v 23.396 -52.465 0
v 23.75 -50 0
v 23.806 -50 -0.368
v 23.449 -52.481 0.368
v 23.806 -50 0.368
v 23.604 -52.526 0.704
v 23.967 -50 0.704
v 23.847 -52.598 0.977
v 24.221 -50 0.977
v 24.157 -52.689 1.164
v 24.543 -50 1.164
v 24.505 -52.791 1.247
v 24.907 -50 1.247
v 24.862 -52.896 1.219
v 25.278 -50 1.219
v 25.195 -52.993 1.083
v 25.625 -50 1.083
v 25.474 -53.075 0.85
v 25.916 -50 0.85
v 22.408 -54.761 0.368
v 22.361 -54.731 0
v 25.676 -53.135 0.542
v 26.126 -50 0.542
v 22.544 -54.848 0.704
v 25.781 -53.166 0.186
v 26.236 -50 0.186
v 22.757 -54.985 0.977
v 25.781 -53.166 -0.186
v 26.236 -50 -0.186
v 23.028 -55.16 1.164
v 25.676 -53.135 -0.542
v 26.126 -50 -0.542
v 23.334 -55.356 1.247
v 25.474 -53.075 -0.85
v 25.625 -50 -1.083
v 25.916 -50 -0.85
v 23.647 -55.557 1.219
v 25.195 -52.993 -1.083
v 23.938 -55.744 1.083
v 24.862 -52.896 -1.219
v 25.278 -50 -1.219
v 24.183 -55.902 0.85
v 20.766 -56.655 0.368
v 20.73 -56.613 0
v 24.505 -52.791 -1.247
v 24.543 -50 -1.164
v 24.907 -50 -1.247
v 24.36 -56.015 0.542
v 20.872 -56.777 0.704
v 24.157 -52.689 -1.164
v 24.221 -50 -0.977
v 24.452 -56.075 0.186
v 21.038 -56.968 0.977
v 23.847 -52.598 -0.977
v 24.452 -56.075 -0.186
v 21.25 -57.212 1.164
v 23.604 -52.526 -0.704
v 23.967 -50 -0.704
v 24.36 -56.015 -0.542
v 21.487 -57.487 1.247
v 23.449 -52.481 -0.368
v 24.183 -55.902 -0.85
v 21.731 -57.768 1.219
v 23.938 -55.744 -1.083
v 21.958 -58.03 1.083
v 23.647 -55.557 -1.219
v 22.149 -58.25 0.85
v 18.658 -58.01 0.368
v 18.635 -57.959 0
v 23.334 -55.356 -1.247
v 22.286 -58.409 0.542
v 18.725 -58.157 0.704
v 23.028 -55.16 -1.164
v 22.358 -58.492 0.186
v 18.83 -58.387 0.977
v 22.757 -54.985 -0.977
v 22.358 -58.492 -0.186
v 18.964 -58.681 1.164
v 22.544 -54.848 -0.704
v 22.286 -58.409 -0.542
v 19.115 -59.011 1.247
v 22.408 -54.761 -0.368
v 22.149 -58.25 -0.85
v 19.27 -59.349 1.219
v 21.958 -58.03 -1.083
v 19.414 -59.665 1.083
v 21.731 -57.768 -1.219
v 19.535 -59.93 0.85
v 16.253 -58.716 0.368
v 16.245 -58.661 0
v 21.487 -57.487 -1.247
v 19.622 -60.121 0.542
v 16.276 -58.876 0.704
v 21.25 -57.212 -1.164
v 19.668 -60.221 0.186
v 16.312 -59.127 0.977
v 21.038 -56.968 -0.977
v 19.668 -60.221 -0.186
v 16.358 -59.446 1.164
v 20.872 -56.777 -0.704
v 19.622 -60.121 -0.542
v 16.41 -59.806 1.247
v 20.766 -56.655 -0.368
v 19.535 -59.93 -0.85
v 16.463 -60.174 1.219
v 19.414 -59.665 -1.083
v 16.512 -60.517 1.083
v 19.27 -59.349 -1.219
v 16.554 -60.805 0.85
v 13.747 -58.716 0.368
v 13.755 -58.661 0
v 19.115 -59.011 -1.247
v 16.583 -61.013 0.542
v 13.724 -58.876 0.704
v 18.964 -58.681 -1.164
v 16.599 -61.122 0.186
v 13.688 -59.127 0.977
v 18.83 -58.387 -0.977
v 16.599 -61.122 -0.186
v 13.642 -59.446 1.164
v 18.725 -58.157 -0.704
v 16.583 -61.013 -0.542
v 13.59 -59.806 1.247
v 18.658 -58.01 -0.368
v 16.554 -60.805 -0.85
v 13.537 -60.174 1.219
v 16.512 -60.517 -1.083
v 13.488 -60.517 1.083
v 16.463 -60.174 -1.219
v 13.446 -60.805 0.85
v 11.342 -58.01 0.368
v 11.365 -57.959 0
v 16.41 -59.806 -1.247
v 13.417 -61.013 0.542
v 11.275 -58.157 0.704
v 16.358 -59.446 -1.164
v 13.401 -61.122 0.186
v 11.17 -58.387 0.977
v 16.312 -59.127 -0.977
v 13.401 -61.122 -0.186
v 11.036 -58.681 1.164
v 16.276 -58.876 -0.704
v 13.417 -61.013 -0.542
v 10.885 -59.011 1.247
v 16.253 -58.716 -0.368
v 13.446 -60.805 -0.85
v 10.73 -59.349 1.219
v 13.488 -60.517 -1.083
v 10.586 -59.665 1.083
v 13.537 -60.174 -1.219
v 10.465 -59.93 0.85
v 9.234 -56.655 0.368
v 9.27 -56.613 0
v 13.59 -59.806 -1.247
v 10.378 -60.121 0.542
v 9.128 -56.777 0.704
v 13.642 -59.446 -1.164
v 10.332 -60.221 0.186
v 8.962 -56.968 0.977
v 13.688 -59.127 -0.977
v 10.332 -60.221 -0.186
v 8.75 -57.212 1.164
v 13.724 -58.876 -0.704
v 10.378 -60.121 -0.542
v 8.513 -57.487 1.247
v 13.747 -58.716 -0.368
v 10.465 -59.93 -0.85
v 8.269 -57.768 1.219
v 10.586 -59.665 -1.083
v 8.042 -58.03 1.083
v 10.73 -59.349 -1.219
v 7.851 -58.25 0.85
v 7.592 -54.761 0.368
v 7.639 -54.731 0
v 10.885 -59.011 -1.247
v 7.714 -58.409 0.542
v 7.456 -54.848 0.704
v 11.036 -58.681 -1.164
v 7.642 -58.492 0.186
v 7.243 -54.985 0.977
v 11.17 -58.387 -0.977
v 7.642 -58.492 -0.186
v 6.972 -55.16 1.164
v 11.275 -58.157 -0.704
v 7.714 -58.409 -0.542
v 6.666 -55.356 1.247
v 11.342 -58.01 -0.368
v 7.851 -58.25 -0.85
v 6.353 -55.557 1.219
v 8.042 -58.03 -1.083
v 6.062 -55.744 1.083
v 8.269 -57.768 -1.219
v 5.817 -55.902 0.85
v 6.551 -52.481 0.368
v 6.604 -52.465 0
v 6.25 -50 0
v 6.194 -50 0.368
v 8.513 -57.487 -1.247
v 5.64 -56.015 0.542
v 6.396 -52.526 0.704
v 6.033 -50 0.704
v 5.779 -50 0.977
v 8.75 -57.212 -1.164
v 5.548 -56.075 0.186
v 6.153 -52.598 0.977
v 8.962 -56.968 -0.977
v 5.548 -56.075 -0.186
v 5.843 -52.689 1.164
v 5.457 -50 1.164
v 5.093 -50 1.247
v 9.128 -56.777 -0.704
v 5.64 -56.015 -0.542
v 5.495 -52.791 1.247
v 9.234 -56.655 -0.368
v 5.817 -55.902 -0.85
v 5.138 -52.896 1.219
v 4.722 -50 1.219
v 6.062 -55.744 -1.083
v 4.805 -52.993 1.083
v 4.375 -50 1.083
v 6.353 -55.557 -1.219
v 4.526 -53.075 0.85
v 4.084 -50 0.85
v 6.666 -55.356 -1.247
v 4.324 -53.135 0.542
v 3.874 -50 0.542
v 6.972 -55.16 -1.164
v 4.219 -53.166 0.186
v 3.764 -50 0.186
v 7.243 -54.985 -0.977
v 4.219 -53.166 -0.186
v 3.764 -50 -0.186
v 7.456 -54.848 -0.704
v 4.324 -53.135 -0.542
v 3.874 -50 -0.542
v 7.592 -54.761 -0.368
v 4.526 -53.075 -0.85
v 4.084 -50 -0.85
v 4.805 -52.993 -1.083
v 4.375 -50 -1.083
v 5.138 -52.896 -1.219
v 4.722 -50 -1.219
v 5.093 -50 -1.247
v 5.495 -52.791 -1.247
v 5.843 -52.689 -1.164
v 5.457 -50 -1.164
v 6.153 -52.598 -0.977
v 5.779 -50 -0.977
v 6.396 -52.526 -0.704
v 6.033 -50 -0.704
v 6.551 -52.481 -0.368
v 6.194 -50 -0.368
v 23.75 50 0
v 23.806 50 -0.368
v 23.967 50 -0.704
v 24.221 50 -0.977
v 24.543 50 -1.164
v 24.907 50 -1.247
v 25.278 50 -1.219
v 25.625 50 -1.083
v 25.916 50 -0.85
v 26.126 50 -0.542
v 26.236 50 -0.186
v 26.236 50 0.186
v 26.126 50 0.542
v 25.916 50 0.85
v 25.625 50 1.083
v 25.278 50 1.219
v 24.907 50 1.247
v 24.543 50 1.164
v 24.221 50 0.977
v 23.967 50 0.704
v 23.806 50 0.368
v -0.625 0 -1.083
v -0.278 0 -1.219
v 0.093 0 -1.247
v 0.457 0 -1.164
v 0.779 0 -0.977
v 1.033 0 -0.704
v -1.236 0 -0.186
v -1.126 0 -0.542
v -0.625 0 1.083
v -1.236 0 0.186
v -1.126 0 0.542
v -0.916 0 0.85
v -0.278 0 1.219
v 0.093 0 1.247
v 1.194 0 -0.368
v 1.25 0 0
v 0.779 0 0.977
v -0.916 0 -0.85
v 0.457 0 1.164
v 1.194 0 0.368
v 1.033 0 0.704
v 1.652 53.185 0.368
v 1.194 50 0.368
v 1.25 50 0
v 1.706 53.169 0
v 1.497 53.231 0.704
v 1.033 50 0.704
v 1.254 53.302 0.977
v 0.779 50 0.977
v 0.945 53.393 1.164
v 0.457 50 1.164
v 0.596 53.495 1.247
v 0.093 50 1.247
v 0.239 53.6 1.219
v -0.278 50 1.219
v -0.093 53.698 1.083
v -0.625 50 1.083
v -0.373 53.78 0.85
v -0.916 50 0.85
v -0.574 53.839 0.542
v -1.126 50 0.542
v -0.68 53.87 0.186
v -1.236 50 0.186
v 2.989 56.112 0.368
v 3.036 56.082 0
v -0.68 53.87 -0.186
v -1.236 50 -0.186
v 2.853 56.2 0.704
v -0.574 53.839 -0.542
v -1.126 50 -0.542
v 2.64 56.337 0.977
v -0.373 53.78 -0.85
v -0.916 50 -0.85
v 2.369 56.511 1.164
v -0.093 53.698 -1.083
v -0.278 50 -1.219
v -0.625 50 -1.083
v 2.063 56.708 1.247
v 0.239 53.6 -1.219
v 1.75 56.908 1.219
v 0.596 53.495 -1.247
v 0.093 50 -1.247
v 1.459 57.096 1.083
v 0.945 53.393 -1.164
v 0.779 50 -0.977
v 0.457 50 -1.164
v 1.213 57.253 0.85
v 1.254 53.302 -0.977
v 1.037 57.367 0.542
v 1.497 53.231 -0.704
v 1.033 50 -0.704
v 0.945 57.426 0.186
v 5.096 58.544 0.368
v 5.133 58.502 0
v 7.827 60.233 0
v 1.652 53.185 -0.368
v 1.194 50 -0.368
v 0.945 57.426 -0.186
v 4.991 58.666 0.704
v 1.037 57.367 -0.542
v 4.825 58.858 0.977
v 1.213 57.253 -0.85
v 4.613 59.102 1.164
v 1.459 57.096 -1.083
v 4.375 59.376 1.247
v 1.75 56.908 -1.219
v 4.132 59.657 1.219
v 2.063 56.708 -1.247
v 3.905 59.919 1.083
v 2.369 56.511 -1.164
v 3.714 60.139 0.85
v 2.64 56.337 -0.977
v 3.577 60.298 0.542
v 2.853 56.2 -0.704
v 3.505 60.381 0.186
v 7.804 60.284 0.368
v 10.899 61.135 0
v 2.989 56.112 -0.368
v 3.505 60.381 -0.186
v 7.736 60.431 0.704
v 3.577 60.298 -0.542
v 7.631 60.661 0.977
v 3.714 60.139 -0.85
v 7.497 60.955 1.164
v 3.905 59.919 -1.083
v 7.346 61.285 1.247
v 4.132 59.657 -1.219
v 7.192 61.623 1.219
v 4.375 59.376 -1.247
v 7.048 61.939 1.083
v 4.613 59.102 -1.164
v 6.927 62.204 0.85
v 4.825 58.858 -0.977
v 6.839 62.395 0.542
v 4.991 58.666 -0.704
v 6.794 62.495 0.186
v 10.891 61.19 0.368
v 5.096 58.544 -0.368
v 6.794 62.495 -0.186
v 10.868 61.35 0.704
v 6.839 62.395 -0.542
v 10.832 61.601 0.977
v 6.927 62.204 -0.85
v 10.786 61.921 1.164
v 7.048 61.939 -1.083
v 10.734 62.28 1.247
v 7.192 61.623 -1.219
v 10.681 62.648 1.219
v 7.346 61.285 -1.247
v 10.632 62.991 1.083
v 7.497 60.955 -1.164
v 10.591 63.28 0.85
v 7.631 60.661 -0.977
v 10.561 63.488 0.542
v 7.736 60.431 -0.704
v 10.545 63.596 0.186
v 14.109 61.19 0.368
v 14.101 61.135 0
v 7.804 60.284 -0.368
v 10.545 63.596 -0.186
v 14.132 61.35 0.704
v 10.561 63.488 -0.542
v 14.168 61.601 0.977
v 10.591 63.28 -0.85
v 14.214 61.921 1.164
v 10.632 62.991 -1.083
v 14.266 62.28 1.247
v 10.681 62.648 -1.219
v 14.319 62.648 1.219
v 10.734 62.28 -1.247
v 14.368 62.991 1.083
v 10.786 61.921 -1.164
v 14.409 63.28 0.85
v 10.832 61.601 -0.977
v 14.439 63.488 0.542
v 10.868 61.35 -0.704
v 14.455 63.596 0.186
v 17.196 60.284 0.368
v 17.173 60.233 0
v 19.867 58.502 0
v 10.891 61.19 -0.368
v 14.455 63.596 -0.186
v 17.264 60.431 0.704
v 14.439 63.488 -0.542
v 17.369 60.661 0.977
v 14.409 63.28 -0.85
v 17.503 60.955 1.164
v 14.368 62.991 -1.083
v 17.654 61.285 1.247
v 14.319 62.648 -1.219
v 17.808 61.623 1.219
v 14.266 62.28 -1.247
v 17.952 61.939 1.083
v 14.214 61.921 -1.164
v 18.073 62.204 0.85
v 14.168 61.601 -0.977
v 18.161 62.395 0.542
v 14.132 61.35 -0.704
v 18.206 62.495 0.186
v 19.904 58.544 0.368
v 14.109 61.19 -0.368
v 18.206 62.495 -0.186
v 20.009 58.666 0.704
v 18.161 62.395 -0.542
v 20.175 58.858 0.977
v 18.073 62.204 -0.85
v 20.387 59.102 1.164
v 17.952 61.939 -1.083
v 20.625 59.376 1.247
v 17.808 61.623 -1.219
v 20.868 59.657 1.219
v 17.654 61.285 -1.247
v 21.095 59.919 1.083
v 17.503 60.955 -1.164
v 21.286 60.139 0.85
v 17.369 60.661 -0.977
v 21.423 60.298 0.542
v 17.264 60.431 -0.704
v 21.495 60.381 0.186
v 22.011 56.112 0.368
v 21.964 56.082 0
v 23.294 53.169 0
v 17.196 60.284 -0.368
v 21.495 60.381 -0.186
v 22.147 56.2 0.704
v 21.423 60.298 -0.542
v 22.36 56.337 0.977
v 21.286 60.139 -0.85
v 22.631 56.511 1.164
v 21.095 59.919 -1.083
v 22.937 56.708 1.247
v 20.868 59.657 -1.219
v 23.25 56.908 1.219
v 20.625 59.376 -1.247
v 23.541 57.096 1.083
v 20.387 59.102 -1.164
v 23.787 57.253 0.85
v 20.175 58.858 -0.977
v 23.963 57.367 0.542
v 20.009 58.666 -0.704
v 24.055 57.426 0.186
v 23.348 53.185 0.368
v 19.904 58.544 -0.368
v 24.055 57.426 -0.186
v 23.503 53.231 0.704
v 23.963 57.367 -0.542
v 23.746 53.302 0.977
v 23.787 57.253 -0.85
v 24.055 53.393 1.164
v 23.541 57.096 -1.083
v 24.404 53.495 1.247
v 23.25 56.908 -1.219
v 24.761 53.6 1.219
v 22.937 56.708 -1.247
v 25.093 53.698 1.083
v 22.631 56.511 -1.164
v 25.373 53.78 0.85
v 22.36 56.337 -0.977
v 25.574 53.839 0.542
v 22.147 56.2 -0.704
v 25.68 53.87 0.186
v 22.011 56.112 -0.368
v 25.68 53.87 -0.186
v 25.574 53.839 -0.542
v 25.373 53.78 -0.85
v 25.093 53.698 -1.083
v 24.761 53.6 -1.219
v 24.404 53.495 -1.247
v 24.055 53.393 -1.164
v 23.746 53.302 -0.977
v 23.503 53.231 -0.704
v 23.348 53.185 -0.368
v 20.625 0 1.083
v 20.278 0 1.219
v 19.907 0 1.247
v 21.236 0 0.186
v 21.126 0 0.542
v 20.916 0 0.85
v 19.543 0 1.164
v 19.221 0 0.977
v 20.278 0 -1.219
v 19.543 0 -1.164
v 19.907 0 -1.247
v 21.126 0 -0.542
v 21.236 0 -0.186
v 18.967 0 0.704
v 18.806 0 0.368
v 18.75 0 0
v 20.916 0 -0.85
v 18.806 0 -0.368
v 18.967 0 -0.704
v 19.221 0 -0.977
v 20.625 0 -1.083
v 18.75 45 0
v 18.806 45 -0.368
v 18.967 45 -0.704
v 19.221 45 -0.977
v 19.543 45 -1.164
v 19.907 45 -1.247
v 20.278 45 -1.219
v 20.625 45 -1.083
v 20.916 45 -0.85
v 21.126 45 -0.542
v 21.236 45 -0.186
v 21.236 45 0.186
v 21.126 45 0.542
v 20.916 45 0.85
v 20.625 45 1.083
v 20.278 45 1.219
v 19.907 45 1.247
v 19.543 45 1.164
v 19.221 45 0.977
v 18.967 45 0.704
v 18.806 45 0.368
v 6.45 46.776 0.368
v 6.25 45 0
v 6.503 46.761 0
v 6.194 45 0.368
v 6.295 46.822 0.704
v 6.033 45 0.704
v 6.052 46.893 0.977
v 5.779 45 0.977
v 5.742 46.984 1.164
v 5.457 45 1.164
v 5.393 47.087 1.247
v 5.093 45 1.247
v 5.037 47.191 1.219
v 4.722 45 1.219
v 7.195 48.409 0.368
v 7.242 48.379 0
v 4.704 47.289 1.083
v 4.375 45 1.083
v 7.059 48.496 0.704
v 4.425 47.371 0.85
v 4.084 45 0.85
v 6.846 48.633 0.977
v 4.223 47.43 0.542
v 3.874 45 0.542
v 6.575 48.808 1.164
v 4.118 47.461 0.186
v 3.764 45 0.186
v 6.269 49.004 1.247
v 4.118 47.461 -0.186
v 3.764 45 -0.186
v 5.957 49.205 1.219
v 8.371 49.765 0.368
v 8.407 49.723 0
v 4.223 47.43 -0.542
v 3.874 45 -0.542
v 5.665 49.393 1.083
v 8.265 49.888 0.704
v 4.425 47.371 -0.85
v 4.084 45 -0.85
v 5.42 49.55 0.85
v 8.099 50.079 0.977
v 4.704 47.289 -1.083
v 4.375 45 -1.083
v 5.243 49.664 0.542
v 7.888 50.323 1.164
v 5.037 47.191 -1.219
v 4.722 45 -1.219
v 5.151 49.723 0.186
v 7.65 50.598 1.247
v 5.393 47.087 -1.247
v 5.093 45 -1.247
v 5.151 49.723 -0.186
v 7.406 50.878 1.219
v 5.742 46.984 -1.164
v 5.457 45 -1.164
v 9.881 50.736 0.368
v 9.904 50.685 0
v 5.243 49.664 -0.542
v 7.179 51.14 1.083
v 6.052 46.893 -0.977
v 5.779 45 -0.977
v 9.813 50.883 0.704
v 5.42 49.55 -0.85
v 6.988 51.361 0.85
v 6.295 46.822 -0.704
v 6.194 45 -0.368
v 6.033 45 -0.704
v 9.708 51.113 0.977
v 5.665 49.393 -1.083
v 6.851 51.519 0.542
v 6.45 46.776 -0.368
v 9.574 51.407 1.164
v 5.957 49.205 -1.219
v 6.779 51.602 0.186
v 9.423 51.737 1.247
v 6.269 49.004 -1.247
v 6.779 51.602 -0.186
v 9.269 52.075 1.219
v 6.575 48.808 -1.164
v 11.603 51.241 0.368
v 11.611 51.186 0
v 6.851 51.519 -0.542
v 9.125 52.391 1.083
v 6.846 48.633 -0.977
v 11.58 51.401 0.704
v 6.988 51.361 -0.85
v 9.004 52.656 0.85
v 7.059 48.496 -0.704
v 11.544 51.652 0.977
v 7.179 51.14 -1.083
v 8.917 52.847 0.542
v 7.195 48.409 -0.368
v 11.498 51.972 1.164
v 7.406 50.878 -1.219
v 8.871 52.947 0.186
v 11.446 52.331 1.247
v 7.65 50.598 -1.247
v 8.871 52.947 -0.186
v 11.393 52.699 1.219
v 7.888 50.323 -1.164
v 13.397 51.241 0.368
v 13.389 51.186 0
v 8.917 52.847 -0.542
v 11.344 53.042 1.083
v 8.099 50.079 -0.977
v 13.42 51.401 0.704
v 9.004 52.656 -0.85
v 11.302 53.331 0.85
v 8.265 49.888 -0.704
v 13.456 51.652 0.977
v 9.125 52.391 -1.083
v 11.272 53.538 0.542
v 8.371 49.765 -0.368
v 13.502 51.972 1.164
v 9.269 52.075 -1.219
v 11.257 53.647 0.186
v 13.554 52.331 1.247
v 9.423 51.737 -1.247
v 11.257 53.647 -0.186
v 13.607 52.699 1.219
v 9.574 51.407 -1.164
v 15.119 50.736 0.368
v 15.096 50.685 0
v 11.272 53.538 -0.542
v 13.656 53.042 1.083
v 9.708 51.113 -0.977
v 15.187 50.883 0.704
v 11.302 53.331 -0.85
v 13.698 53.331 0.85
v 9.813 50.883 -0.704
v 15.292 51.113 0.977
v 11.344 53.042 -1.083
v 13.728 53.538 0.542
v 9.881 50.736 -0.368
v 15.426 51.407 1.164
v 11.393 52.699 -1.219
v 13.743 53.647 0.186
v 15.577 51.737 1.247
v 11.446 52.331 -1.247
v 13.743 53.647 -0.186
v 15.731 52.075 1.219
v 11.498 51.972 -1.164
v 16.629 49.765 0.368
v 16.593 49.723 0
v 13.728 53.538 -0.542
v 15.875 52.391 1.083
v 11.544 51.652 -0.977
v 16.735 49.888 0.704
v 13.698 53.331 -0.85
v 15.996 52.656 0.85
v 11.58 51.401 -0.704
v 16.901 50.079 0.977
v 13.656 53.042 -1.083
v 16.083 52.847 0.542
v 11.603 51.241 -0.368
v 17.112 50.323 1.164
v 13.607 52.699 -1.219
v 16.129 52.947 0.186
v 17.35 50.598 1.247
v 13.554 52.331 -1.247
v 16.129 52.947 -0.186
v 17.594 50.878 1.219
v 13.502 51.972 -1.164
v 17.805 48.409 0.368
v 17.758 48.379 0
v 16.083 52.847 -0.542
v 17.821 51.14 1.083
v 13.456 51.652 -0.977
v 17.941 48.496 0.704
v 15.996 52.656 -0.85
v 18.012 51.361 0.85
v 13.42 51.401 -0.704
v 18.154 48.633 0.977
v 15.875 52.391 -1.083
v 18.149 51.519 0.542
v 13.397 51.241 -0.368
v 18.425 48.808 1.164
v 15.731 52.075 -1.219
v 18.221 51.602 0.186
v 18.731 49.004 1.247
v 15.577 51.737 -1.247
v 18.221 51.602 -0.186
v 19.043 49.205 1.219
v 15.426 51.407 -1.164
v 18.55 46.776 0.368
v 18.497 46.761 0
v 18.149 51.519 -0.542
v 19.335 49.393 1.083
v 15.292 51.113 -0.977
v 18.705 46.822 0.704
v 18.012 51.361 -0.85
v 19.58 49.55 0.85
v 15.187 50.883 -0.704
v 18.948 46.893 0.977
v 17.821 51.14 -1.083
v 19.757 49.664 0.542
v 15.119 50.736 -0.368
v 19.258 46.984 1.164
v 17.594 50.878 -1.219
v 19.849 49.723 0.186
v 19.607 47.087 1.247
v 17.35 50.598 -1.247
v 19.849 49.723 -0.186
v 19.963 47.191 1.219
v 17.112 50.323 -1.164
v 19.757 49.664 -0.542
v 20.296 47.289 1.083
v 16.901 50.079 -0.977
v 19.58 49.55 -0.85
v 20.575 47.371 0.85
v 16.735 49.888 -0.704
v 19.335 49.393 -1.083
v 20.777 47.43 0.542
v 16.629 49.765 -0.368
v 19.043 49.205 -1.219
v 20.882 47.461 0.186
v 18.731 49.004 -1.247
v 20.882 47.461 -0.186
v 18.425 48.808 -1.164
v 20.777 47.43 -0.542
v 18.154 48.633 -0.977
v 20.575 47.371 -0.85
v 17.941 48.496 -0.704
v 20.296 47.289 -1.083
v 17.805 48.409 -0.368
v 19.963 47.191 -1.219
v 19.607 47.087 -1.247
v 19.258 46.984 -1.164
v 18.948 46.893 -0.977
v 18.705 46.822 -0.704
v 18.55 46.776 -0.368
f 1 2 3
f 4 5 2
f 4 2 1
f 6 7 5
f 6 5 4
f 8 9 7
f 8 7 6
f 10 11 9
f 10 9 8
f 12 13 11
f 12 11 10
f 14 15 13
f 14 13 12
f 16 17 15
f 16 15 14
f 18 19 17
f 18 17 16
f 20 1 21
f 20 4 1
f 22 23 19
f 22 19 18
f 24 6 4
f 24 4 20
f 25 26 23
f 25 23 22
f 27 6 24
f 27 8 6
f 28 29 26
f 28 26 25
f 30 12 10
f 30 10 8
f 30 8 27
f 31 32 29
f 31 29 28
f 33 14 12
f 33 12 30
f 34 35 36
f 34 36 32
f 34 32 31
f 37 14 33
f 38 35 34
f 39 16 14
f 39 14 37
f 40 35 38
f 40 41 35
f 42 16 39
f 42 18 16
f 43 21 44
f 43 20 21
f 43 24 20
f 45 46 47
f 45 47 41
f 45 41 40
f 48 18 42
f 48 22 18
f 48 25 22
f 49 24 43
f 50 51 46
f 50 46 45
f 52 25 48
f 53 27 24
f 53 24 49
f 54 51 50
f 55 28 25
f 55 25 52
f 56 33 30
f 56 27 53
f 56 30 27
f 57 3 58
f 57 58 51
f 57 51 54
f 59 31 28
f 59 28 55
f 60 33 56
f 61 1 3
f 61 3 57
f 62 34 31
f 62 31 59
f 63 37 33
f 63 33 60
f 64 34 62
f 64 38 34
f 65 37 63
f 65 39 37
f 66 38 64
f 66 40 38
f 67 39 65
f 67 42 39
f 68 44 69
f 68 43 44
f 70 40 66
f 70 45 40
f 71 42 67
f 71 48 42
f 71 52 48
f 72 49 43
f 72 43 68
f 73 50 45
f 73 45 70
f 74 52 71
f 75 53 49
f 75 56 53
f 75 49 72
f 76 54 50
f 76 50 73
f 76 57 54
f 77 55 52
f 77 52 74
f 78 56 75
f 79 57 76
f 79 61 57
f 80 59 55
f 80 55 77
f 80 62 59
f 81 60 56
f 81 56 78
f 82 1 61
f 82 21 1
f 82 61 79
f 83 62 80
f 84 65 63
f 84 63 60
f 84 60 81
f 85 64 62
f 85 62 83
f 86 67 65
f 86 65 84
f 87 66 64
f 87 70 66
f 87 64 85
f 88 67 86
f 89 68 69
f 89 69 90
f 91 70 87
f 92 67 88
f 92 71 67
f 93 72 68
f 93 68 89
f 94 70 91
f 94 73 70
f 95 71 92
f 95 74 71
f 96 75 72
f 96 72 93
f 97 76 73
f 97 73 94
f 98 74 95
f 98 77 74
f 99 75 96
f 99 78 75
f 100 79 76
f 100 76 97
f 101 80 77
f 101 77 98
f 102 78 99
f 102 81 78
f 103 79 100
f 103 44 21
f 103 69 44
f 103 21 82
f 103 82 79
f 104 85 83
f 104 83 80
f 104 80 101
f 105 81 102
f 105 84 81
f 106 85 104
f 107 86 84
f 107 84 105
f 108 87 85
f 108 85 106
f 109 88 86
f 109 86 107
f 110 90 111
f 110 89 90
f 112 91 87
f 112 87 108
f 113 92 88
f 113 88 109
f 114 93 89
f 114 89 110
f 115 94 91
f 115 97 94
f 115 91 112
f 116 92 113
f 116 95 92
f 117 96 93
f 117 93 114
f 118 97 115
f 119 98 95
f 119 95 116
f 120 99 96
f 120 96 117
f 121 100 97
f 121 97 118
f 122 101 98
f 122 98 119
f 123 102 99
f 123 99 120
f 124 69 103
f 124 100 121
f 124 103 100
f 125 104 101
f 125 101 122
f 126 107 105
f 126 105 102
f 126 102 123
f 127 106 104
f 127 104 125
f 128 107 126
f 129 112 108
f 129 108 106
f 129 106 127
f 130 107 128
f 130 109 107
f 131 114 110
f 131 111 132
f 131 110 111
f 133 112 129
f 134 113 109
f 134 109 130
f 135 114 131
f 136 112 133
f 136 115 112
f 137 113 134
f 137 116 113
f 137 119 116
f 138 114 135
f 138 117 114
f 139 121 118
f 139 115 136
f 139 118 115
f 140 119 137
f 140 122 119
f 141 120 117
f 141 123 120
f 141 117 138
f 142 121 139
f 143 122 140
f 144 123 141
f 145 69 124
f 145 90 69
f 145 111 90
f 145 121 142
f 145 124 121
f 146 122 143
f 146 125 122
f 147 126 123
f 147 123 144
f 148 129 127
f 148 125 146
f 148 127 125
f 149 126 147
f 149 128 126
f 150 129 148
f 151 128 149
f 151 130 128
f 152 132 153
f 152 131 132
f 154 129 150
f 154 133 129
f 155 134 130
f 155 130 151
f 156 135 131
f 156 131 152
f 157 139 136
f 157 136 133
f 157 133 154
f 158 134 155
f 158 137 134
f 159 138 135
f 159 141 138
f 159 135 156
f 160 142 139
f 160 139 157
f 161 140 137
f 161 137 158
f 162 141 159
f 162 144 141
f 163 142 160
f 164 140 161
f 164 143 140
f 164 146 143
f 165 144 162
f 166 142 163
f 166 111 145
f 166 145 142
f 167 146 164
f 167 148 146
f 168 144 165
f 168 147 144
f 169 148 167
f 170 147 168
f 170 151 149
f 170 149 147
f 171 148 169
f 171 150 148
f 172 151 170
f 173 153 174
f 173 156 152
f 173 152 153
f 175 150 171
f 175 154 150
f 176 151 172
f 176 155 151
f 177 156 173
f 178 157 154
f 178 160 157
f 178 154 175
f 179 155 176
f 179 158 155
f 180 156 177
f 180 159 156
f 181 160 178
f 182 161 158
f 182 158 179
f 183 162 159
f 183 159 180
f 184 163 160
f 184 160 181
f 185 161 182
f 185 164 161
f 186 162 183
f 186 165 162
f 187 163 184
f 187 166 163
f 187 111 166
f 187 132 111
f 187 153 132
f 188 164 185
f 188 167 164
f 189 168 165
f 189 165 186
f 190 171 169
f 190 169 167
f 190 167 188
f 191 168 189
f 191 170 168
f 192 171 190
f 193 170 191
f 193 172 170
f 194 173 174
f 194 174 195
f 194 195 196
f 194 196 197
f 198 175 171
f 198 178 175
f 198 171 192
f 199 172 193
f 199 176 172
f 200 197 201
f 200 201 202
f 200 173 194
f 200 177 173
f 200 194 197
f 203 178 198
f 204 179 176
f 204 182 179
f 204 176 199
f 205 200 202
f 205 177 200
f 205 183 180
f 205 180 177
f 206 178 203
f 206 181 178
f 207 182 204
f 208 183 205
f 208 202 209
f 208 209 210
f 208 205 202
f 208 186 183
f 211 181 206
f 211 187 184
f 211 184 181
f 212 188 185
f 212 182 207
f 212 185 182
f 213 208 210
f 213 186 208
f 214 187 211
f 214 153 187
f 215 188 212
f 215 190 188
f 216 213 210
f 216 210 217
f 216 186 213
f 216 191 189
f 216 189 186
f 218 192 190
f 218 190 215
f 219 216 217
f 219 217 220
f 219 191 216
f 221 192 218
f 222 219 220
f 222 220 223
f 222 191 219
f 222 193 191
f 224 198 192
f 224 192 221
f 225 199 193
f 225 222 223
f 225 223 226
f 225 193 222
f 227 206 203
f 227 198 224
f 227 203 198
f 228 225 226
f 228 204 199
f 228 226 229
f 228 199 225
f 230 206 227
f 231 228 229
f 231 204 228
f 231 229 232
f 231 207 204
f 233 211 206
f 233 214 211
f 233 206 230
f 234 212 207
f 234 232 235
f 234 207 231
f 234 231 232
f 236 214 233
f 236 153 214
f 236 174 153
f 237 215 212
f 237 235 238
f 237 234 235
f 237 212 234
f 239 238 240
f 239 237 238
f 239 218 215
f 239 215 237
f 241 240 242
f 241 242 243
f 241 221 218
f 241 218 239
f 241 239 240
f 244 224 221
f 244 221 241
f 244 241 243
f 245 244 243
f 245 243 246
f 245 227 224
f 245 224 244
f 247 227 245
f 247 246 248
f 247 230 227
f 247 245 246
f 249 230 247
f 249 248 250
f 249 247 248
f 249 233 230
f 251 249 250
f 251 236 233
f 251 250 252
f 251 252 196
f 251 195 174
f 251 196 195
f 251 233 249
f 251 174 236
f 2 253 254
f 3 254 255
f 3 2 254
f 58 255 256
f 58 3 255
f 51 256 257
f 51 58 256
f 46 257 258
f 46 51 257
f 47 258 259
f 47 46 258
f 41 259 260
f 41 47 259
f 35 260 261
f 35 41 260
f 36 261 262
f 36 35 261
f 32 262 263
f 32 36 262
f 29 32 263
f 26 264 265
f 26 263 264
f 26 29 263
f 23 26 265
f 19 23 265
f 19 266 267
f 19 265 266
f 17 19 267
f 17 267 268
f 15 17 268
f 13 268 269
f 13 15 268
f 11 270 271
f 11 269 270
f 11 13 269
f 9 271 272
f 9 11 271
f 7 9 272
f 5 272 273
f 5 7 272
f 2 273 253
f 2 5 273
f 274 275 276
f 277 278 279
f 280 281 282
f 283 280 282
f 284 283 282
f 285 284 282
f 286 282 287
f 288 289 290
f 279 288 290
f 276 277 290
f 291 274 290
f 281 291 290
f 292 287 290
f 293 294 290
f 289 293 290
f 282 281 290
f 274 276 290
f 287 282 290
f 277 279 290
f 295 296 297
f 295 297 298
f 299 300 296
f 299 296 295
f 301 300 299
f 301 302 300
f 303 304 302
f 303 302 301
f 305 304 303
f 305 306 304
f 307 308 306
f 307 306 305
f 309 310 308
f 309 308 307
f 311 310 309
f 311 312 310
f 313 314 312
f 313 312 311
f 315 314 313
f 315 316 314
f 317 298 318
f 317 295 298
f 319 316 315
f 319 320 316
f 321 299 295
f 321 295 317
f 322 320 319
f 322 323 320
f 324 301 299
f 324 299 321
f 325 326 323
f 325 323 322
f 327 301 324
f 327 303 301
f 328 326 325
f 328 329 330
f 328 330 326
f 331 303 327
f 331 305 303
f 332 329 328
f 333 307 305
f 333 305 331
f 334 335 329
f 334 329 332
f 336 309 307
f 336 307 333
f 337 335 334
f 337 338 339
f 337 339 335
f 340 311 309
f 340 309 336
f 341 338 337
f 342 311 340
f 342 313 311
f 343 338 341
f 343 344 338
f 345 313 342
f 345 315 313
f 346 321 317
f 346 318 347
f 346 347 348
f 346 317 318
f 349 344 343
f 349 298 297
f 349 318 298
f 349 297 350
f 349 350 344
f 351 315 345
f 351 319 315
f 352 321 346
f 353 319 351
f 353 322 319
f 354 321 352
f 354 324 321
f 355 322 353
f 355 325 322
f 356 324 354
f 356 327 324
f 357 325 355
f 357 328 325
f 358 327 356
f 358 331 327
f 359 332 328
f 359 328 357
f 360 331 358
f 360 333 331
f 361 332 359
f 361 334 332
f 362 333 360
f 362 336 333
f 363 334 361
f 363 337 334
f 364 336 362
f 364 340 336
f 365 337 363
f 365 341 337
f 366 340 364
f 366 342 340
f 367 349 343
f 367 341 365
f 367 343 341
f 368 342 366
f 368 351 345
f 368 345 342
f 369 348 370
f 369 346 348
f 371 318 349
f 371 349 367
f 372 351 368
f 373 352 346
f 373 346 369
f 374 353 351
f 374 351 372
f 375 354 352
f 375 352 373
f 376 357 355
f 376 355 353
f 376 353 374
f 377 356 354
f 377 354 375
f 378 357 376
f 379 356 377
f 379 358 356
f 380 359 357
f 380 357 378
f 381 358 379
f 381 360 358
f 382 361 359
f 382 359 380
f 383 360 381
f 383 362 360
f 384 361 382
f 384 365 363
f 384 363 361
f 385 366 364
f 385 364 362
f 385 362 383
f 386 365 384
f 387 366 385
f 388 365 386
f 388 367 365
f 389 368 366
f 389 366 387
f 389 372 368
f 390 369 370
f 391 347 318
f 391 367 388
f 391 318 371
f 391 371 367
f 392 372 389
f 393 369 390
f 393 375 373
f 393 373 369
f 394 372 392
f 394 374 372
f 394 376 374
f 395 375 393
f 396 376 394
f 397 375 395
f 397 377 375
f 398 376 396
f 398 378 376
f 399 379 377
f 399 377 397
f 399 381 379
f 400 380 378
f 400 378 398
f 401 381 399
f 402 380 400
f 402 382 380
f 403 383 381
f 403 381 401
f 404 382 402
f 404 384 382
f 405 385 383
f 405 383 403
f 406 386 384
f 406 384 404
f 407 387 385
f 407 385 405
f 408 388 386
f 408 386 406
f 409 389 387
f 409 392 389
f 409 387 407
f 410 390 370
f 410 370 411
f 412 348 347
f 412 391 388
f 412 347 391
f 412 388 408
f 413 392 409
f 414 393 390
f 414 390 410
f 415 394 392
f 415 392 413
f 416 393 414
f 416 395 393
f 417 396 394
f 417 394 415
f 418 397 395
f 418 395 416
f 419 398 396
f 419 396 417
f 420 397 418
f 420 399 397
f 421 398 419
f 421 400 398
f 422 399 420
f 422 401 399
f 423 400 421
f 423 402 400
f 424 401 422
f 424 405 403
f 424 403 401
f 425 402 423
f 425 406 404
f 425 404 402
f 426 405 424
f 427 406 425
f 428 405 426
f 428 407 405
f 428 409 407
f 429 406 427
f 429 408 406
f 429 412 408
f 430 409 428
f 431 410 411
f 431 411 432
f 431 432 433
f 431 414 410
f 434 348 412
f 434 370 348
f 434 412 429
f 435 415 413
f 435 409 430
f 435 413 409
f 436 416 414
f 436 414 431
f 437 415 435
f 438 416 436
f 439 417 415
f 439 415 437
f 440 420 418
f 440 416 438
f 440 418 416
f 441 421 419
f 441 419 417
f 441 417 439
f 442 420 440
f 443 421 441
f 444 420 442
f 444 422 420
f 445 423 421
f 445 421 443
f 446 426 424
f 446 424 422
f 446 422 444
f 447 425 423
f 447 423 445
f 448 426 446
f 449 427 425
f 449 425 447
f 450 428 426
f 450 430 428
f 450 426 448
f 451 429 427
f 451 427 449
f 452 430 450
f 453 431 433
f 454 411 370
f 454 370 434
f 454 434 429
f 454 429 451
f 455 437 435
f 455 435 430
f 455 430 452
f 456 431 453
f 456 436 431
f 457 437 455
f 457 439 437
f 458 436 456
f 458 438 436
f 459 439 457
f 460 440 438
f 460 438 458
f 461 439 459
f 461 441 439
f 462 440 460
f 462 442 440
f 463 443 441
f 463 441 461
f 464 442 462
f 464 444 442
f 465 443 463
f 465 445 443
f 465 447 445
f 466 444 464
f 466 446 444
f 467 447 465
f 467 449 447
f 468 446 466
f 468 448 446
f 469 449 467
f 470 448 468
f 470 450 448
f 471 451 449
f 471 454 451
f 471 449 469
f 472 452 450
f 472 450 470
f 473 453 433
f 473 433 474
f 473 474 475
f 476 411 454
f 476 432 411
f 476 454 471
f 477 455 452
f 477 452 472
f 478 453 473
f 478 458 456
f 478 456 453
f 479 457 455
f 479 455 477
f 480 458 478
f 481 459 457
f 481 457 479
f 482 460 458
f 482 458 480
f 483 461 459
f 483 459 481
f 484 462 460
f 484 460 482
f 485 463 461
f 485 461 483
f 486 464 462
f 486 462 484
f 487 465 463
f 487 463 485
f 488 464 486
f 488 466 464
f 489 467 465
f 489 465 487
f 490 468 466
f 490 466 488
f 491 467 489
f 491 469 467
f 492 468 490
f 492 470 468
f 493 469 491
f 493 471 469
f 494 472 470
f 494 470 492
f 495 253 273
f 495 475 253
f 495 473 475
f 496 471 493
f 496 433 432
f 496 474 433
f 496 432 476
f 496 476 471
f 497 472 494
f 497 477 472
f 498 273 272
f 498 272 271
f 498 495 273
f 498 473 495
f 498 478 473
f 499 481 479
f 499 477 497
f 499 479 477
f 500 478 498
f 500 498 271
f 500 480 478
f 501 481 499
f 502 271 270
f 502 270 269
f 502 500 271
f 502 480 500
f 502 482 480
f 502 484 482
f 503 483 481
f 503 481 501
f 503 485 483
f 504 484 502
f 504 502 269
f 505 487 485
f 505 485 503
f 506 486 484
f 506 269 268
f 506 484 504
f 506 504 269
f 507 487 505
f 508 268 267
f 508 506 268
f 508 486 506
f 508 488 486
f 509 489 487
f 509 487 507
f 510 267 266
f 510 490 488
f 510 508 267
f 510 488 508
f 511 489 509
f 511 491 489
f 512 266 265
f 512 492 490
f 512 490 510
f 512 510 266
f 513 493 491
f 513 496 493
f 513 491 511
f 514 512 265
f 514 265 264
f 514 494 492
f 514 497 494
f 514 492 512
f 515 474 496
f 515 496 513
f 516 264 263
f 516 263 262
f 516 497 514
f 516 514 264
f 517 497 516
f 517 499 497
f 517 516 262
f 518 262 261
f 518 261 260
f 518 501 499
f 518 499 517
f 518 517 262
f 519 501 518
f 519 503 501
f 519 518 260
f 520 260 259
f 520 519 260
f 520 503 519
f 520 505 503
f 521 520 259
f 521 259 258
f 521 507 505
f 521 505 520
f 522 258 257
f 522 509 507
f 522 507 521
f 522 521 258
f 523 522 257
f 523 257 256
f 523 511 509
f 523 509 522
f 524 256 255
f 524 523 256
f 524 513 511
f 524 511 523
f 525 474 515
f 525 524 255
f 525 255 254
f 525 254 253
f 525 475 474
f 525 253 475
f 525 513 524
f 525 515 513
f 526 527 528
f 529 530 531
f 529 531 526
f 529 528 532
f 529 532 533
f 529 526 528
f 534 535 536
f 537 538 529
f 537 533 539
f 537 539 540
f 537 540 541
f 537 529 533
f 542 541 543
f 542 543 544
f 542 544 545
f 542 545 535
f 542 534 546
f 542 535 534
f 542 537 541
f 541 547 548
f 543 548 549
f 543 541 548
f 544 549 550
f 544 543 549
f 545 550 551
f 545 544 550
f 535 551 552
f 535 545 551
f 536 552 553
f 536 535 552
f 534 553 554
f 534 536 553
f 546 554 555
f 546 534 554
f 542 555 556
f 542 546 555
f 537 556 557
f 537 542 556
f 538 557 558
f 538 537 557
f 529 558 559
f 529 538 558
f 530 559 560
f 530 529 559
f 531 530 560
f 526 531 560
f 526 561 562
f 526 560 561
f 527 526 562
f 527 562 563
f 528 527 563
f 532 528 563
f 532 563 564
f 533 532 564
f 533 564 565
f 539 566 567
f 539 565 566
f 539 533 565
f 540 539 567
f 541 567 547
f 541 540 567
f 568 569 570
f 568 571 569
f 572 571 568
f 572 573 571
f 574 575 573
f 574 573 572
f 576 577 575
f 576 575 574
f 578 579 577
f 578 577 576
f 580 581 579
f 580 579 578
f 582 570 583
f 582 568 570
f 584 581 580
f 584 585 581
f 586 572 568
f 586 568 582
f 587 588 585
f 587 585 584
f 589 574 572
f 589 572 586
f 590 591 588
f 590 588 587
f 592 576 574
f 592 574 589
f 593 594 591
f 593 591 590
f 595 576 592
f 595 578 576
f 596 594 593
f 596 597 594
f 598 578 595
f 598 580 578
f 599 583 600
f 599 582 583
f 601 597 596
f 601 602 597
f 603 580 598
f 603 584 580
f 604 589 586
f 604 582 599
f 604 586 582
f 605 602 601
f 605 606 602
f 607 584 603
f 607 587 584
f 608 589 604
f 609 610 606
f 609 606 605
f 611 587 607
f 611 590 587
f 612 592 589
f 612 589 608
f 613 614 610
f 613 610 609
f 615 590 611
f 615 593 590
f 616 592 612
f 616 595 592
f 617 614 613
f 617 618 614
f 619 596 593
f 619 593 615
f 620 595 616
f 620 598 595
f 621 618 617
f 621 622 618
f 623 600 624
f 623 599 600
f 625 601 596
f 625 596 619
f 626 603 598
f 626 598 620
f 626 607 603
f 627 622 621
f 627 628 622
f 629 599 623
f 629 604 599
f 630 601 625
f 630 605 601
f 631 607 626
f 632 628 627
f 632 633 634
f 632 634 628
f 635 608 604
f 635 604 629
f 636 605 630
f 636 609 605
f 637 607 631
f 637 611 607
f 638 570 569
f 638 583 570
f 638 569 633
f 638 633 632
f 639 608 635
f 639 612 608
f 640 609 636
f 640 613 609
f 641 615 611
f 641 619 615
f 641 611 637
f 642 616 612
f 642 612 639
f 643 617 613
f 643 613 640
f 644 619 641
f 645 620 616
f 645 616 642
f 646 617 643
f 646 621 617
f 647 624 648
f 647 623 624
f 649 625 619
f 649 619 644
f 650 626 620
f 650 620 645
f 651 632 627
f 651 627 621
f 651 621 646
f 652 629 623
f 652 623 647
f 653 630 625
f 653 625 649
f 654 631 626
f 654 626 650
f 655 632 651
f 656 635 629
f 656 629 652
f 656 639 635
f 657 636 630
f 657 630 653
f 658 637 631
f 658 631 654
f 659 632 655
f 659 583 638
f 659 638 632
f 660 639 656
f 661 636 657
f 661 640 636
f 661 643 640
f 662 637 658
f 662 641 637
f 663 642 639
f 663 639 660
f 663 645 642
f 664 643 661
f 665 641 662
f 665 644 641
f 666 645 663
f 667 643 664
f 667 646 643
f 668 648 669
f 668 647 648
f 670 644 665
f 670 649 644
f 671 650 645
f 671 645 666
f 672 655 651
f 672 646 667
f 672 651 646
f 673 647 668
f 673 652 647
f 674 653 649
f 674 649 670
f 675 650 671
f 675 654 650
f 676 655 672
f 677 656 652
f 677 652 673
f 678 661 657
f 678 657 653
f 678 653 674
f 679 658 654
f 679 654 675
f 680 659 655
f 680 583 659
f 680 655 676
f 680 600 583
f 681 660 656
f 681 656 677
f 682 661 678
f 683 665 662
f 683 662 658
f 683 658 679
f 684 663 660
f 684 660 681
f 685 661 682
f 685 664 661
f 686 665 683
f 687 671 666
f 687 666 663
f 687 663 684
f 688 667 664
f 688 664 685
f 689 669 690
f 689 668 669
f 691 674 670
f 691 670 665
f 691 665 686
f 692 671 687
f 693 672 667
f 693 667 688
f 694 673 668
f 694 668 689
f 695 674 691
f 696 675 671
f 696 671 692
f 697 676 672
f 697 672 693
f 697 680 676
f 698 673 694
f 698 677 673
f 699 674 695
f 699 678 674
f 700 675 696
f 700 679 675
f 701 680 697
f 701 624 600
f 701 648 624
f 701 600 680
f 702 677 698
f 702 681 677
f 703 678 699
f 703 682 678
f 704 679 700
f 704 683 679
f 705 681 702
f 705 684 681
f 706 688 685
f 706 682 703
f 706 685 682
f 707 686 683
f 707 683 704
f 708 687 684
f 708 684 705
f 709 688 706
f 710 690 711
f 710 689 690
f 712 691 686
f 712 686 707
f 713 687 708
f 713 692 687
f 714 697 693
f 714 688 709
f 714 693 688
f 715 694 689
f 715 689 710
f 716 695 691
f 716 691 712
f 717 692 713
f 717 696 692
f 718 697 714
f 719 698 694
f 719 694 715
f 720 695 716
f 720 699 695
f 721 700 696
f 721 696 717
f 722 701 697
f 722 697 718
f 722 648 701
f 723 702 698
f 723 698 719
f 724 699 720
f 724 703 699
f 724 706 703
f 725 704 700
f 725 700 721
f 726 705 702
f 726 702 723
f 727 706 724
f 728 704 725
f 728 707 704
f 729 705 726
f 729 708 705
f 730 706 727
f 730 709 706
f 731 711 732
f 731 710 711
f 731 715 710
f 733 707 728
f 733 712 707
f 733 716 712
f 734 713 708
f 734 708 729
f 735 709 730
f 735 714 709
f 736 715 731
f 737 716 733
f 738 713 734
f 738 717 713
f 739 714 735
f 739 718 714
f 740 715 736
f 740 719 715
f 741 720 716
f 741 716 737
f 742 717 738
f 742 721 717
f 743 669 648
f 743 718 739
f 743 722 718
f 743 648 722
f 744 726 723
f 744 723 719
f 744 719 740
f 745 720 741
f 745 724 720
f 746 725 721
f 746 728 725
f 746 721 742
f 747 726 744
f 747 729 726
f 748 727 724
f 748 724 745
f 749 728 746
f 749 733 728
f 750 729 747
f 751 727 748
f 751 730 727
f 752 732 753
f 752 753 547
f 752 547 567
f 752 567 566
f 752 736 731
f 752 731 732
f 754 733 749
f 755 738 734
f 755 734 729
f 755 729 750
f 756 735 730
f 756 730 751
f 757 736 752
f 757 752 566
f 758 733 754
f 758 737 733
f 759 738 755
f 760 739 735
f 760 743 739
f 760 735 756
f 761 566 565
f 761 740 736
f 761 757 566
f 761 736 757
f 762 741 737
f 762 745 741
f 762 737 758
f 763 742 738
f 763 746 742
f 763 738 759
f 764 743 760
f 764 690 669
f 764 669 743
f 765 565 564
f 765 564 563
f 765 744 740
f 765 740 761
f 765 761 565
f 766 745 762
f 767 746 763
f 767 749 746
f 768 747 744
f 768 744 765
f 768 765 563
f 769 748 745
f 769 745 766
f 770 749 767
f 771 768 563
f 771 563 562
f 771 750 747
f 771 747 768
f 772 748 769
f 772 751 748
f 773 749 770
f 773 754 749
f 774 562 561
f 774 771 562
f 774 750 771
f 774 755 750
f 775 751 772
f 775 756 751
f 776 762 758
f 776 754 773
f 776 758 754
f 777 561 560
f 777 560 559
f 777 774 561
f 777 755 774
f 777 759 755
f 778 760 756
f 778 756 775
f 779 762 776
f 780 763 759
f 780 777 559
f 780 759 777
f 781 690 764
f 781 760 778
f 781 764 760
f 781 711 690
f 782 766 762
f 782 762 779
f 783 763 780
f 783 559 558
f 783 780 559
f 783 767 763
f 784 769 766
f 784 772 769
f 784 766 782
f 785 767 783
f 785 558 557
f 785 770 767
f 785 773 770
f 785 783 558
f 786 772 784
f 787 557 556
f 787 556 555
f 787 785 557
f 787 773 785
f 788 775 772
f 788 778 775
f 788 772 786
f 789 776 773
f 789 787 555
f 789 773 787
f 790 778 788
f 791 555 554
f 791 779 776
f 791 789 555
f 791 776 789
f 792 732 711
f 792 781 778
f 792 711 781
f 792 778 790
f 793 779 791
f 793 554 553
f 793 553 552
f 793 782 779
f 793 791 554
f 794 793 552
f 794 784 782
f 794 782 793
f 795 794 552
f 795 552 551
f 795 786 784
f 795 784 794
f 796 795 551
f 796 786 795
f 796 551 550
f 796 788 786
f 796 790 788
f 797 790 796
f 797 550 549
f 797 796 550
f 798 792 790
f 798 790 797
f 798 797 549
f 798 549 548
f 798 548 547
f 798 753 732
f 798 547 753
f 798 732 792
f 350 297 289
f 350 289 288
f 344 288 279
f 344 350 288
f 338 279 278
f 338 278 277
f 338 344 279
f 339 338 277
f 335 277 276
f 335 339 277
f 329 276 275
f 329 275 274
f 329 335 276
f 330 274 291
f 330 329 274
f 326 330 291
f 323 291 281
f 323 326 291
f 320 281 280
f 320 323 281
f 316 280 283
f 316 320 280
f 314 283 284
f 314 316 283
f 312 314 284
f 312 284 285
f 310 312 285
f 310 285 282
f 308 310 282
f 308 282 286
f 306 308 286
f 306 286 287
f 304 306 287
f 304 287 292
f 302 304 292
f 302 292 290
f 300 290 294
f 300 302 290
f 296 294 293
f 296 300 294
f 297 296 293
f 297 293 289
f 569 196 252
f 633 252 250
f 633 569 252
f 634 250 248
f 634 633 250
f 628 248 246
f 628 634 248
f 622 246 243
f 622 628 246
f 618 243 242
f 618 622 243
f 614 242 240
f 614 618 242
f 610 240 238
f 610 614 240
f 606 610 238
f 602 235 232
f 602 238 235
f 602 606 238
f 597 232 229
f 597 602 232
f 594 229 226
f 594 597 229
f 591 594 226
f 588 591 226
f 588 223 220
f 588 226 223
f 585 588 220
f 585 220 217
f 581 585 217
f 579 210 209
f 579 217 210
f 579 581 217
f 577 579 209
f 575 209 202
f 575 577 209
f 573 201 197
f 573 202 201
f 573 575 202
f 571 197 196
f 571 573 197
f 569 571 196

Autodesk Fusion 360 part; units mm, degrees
sketch "Sketch6" plane through (0, 0, 0) normal (0, 0, 1) x (1, 0, 0)
  line L0 (0, 0) -> (0, 50)
  arc A0 (25, 50) -> (0, 50) centre (12.5, 50) ccw
  line L1 (25, 50) -> (25, -50)
  arc A1 (5, -50) -> (25, -50) centre (15, -50) ccw
  line L2 (5, -50) -> (5, 45)
  arc A2 (20, 45) -> (5, 45) centre (12.5, 45) ccw
  line L3 (20, 45) -> (20, 0)
sketch "Sketch8" plane through (0, 0, 0) normal (0, 1, 0) x (1, 0, 0)
  circle A0 centre (0, 0) radius 1.25
  dimension "d4" = 2.5
sweep "Sweep1" add profiles "Sketch8" path "Sketch6" along L0 A0 L1 A1 L2 A2 L3 section 1
